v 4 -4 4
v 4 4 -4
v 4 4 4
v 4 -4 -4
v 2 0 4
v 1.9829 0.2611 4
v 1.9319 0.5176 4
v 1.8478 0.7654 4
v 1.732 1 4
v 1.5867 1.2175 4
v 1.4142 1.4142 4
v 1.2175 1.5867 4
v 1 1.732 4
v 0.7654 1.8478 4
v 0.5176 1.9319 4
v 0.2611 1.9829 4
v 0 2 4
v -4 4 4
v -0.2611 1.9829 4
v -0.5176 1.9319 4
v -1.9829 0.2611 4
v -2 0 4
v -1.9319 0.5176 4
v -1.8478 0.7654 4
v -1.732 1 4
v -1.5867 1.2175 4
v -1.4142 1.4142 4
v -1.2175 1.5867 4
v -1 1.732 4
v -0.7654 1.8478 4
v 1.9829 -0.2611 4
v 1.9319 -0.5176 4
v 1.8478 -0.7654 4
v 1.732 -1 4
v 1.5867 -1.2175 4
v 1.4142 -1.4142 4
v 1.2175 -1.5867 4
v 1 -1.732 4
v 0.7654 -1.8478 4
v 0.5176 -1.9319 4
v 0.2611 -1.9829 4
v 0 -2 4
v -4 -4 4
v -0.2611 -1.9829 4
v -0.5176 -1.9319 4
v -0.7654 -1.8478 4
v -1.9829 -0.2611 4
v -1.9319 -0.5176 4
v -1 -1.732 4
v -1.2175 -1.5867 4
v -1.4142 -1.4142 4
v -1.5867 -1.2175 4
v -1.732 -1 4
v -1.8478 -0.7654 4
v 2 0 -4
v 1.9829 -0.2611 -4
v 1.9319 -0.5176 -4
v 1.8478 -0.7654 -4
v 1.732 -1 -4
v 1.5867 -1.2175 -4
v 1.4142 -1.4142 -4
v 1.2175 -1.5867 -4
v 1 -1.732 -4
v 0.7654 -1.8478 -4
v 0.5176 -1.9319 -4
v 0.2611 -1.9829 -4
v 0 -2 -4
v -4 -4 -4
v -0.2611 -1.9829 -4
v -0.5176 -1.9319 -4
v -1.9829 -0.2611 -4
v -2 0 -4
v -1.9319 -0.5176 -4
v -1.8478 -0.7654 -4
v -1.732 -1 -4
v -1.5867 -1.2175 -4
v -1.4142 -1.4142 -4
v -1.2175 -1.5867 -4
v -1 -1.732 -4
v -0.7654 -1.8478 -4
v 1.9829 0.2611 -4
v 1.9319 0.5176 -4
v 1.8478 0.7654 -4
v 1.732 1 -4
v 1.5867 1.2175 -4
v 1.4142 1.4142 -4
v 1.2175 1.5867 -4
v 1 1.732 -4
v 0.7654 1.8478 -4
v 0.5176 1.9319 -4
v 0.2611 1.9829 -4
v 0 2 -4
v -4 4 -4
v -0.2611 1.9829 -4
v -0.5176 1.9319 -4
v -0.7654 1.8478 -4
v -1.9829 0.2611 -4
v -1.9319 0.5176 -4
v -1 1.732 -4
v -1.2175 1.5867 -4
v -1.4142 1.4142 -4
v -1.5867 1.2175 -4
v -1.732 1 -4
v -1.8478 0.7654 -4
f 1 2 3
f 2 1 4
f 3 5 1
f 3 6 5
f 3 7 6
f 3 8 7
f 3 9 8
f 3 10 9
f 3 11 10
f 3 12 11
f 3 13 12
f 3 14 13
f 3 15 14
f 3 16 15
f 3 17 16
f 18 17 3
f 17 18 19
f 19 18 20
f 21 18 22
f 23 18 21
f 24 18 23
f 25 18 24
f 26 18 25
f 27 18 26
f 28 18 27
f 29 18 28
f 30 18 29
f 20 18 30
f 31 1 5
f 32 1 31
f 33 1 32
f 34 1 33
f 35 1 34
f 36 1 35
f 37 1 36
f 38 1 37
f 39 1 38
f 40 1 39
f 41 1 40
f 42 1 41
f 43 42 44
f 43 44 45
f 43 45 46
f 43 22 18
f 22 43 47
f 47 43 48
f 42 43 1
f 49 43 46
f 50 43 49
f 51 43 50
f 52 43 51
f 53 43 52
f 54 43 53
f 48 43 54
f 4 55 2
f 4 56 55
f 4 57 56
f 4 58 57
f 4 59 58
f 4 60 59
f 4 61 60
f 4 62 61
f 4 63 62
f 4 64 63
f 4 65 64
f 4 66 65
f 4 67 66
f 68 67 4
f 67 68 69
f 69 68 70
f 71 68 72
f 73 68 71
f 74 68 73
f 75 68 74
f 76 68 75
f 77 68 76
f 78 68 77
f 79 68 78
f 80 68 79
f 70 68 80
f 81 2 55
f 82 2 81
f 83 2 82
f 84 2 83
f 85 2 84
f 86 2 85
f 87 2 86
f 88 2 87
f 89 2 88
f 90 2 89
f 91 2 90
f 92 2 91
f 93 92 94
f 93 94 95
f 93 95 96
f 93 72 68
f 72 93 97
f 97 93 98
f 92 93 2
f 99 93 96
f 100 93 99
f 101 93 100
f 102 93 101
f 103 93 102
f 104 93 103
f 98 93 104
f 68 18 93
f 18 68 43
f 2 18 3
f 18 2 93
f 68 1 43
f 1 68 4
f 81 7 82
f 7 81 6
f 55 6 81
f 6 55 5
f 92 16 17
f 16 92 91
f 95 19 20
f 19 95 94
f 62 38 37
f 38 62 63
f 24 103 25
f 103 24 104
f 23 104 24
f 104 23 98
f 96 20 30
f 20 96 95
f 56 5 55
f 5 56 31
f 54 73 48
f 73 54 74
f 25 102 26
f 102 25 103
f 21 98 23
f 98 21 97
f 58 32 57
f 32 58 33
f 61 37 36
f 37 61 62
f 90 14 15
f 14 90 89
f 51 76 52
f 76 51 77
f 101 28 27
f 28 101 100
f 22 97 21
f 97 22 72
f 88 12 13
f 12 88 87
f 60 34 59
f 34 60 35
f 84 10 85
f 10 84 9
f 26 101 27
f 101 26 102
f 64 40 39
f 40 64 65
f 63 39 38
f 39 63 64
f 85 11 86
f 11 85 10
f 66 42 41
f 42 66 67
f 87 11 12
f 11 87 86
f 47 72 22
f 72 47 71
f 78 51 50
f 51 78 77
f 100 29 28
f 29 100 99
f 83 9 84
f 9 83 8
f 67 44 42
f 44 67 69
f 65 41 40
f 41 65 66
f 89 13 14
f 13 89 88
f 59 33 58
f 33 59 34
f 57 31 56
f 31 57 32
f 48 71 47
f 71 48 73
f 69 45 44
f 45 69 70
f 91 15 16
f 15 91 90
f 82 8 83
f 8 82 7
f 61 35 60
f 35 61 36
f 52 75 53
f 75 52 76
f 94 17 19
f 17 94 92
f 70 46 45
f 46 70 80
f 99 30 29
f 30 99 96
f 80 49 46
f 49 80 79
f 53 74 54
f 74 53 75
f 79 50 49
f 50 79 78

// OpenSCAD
difference() {
    cube([8, 8, 8], center = true);
    cylinder(h = 12, r = 2, center = true, $fn = 48);
}
